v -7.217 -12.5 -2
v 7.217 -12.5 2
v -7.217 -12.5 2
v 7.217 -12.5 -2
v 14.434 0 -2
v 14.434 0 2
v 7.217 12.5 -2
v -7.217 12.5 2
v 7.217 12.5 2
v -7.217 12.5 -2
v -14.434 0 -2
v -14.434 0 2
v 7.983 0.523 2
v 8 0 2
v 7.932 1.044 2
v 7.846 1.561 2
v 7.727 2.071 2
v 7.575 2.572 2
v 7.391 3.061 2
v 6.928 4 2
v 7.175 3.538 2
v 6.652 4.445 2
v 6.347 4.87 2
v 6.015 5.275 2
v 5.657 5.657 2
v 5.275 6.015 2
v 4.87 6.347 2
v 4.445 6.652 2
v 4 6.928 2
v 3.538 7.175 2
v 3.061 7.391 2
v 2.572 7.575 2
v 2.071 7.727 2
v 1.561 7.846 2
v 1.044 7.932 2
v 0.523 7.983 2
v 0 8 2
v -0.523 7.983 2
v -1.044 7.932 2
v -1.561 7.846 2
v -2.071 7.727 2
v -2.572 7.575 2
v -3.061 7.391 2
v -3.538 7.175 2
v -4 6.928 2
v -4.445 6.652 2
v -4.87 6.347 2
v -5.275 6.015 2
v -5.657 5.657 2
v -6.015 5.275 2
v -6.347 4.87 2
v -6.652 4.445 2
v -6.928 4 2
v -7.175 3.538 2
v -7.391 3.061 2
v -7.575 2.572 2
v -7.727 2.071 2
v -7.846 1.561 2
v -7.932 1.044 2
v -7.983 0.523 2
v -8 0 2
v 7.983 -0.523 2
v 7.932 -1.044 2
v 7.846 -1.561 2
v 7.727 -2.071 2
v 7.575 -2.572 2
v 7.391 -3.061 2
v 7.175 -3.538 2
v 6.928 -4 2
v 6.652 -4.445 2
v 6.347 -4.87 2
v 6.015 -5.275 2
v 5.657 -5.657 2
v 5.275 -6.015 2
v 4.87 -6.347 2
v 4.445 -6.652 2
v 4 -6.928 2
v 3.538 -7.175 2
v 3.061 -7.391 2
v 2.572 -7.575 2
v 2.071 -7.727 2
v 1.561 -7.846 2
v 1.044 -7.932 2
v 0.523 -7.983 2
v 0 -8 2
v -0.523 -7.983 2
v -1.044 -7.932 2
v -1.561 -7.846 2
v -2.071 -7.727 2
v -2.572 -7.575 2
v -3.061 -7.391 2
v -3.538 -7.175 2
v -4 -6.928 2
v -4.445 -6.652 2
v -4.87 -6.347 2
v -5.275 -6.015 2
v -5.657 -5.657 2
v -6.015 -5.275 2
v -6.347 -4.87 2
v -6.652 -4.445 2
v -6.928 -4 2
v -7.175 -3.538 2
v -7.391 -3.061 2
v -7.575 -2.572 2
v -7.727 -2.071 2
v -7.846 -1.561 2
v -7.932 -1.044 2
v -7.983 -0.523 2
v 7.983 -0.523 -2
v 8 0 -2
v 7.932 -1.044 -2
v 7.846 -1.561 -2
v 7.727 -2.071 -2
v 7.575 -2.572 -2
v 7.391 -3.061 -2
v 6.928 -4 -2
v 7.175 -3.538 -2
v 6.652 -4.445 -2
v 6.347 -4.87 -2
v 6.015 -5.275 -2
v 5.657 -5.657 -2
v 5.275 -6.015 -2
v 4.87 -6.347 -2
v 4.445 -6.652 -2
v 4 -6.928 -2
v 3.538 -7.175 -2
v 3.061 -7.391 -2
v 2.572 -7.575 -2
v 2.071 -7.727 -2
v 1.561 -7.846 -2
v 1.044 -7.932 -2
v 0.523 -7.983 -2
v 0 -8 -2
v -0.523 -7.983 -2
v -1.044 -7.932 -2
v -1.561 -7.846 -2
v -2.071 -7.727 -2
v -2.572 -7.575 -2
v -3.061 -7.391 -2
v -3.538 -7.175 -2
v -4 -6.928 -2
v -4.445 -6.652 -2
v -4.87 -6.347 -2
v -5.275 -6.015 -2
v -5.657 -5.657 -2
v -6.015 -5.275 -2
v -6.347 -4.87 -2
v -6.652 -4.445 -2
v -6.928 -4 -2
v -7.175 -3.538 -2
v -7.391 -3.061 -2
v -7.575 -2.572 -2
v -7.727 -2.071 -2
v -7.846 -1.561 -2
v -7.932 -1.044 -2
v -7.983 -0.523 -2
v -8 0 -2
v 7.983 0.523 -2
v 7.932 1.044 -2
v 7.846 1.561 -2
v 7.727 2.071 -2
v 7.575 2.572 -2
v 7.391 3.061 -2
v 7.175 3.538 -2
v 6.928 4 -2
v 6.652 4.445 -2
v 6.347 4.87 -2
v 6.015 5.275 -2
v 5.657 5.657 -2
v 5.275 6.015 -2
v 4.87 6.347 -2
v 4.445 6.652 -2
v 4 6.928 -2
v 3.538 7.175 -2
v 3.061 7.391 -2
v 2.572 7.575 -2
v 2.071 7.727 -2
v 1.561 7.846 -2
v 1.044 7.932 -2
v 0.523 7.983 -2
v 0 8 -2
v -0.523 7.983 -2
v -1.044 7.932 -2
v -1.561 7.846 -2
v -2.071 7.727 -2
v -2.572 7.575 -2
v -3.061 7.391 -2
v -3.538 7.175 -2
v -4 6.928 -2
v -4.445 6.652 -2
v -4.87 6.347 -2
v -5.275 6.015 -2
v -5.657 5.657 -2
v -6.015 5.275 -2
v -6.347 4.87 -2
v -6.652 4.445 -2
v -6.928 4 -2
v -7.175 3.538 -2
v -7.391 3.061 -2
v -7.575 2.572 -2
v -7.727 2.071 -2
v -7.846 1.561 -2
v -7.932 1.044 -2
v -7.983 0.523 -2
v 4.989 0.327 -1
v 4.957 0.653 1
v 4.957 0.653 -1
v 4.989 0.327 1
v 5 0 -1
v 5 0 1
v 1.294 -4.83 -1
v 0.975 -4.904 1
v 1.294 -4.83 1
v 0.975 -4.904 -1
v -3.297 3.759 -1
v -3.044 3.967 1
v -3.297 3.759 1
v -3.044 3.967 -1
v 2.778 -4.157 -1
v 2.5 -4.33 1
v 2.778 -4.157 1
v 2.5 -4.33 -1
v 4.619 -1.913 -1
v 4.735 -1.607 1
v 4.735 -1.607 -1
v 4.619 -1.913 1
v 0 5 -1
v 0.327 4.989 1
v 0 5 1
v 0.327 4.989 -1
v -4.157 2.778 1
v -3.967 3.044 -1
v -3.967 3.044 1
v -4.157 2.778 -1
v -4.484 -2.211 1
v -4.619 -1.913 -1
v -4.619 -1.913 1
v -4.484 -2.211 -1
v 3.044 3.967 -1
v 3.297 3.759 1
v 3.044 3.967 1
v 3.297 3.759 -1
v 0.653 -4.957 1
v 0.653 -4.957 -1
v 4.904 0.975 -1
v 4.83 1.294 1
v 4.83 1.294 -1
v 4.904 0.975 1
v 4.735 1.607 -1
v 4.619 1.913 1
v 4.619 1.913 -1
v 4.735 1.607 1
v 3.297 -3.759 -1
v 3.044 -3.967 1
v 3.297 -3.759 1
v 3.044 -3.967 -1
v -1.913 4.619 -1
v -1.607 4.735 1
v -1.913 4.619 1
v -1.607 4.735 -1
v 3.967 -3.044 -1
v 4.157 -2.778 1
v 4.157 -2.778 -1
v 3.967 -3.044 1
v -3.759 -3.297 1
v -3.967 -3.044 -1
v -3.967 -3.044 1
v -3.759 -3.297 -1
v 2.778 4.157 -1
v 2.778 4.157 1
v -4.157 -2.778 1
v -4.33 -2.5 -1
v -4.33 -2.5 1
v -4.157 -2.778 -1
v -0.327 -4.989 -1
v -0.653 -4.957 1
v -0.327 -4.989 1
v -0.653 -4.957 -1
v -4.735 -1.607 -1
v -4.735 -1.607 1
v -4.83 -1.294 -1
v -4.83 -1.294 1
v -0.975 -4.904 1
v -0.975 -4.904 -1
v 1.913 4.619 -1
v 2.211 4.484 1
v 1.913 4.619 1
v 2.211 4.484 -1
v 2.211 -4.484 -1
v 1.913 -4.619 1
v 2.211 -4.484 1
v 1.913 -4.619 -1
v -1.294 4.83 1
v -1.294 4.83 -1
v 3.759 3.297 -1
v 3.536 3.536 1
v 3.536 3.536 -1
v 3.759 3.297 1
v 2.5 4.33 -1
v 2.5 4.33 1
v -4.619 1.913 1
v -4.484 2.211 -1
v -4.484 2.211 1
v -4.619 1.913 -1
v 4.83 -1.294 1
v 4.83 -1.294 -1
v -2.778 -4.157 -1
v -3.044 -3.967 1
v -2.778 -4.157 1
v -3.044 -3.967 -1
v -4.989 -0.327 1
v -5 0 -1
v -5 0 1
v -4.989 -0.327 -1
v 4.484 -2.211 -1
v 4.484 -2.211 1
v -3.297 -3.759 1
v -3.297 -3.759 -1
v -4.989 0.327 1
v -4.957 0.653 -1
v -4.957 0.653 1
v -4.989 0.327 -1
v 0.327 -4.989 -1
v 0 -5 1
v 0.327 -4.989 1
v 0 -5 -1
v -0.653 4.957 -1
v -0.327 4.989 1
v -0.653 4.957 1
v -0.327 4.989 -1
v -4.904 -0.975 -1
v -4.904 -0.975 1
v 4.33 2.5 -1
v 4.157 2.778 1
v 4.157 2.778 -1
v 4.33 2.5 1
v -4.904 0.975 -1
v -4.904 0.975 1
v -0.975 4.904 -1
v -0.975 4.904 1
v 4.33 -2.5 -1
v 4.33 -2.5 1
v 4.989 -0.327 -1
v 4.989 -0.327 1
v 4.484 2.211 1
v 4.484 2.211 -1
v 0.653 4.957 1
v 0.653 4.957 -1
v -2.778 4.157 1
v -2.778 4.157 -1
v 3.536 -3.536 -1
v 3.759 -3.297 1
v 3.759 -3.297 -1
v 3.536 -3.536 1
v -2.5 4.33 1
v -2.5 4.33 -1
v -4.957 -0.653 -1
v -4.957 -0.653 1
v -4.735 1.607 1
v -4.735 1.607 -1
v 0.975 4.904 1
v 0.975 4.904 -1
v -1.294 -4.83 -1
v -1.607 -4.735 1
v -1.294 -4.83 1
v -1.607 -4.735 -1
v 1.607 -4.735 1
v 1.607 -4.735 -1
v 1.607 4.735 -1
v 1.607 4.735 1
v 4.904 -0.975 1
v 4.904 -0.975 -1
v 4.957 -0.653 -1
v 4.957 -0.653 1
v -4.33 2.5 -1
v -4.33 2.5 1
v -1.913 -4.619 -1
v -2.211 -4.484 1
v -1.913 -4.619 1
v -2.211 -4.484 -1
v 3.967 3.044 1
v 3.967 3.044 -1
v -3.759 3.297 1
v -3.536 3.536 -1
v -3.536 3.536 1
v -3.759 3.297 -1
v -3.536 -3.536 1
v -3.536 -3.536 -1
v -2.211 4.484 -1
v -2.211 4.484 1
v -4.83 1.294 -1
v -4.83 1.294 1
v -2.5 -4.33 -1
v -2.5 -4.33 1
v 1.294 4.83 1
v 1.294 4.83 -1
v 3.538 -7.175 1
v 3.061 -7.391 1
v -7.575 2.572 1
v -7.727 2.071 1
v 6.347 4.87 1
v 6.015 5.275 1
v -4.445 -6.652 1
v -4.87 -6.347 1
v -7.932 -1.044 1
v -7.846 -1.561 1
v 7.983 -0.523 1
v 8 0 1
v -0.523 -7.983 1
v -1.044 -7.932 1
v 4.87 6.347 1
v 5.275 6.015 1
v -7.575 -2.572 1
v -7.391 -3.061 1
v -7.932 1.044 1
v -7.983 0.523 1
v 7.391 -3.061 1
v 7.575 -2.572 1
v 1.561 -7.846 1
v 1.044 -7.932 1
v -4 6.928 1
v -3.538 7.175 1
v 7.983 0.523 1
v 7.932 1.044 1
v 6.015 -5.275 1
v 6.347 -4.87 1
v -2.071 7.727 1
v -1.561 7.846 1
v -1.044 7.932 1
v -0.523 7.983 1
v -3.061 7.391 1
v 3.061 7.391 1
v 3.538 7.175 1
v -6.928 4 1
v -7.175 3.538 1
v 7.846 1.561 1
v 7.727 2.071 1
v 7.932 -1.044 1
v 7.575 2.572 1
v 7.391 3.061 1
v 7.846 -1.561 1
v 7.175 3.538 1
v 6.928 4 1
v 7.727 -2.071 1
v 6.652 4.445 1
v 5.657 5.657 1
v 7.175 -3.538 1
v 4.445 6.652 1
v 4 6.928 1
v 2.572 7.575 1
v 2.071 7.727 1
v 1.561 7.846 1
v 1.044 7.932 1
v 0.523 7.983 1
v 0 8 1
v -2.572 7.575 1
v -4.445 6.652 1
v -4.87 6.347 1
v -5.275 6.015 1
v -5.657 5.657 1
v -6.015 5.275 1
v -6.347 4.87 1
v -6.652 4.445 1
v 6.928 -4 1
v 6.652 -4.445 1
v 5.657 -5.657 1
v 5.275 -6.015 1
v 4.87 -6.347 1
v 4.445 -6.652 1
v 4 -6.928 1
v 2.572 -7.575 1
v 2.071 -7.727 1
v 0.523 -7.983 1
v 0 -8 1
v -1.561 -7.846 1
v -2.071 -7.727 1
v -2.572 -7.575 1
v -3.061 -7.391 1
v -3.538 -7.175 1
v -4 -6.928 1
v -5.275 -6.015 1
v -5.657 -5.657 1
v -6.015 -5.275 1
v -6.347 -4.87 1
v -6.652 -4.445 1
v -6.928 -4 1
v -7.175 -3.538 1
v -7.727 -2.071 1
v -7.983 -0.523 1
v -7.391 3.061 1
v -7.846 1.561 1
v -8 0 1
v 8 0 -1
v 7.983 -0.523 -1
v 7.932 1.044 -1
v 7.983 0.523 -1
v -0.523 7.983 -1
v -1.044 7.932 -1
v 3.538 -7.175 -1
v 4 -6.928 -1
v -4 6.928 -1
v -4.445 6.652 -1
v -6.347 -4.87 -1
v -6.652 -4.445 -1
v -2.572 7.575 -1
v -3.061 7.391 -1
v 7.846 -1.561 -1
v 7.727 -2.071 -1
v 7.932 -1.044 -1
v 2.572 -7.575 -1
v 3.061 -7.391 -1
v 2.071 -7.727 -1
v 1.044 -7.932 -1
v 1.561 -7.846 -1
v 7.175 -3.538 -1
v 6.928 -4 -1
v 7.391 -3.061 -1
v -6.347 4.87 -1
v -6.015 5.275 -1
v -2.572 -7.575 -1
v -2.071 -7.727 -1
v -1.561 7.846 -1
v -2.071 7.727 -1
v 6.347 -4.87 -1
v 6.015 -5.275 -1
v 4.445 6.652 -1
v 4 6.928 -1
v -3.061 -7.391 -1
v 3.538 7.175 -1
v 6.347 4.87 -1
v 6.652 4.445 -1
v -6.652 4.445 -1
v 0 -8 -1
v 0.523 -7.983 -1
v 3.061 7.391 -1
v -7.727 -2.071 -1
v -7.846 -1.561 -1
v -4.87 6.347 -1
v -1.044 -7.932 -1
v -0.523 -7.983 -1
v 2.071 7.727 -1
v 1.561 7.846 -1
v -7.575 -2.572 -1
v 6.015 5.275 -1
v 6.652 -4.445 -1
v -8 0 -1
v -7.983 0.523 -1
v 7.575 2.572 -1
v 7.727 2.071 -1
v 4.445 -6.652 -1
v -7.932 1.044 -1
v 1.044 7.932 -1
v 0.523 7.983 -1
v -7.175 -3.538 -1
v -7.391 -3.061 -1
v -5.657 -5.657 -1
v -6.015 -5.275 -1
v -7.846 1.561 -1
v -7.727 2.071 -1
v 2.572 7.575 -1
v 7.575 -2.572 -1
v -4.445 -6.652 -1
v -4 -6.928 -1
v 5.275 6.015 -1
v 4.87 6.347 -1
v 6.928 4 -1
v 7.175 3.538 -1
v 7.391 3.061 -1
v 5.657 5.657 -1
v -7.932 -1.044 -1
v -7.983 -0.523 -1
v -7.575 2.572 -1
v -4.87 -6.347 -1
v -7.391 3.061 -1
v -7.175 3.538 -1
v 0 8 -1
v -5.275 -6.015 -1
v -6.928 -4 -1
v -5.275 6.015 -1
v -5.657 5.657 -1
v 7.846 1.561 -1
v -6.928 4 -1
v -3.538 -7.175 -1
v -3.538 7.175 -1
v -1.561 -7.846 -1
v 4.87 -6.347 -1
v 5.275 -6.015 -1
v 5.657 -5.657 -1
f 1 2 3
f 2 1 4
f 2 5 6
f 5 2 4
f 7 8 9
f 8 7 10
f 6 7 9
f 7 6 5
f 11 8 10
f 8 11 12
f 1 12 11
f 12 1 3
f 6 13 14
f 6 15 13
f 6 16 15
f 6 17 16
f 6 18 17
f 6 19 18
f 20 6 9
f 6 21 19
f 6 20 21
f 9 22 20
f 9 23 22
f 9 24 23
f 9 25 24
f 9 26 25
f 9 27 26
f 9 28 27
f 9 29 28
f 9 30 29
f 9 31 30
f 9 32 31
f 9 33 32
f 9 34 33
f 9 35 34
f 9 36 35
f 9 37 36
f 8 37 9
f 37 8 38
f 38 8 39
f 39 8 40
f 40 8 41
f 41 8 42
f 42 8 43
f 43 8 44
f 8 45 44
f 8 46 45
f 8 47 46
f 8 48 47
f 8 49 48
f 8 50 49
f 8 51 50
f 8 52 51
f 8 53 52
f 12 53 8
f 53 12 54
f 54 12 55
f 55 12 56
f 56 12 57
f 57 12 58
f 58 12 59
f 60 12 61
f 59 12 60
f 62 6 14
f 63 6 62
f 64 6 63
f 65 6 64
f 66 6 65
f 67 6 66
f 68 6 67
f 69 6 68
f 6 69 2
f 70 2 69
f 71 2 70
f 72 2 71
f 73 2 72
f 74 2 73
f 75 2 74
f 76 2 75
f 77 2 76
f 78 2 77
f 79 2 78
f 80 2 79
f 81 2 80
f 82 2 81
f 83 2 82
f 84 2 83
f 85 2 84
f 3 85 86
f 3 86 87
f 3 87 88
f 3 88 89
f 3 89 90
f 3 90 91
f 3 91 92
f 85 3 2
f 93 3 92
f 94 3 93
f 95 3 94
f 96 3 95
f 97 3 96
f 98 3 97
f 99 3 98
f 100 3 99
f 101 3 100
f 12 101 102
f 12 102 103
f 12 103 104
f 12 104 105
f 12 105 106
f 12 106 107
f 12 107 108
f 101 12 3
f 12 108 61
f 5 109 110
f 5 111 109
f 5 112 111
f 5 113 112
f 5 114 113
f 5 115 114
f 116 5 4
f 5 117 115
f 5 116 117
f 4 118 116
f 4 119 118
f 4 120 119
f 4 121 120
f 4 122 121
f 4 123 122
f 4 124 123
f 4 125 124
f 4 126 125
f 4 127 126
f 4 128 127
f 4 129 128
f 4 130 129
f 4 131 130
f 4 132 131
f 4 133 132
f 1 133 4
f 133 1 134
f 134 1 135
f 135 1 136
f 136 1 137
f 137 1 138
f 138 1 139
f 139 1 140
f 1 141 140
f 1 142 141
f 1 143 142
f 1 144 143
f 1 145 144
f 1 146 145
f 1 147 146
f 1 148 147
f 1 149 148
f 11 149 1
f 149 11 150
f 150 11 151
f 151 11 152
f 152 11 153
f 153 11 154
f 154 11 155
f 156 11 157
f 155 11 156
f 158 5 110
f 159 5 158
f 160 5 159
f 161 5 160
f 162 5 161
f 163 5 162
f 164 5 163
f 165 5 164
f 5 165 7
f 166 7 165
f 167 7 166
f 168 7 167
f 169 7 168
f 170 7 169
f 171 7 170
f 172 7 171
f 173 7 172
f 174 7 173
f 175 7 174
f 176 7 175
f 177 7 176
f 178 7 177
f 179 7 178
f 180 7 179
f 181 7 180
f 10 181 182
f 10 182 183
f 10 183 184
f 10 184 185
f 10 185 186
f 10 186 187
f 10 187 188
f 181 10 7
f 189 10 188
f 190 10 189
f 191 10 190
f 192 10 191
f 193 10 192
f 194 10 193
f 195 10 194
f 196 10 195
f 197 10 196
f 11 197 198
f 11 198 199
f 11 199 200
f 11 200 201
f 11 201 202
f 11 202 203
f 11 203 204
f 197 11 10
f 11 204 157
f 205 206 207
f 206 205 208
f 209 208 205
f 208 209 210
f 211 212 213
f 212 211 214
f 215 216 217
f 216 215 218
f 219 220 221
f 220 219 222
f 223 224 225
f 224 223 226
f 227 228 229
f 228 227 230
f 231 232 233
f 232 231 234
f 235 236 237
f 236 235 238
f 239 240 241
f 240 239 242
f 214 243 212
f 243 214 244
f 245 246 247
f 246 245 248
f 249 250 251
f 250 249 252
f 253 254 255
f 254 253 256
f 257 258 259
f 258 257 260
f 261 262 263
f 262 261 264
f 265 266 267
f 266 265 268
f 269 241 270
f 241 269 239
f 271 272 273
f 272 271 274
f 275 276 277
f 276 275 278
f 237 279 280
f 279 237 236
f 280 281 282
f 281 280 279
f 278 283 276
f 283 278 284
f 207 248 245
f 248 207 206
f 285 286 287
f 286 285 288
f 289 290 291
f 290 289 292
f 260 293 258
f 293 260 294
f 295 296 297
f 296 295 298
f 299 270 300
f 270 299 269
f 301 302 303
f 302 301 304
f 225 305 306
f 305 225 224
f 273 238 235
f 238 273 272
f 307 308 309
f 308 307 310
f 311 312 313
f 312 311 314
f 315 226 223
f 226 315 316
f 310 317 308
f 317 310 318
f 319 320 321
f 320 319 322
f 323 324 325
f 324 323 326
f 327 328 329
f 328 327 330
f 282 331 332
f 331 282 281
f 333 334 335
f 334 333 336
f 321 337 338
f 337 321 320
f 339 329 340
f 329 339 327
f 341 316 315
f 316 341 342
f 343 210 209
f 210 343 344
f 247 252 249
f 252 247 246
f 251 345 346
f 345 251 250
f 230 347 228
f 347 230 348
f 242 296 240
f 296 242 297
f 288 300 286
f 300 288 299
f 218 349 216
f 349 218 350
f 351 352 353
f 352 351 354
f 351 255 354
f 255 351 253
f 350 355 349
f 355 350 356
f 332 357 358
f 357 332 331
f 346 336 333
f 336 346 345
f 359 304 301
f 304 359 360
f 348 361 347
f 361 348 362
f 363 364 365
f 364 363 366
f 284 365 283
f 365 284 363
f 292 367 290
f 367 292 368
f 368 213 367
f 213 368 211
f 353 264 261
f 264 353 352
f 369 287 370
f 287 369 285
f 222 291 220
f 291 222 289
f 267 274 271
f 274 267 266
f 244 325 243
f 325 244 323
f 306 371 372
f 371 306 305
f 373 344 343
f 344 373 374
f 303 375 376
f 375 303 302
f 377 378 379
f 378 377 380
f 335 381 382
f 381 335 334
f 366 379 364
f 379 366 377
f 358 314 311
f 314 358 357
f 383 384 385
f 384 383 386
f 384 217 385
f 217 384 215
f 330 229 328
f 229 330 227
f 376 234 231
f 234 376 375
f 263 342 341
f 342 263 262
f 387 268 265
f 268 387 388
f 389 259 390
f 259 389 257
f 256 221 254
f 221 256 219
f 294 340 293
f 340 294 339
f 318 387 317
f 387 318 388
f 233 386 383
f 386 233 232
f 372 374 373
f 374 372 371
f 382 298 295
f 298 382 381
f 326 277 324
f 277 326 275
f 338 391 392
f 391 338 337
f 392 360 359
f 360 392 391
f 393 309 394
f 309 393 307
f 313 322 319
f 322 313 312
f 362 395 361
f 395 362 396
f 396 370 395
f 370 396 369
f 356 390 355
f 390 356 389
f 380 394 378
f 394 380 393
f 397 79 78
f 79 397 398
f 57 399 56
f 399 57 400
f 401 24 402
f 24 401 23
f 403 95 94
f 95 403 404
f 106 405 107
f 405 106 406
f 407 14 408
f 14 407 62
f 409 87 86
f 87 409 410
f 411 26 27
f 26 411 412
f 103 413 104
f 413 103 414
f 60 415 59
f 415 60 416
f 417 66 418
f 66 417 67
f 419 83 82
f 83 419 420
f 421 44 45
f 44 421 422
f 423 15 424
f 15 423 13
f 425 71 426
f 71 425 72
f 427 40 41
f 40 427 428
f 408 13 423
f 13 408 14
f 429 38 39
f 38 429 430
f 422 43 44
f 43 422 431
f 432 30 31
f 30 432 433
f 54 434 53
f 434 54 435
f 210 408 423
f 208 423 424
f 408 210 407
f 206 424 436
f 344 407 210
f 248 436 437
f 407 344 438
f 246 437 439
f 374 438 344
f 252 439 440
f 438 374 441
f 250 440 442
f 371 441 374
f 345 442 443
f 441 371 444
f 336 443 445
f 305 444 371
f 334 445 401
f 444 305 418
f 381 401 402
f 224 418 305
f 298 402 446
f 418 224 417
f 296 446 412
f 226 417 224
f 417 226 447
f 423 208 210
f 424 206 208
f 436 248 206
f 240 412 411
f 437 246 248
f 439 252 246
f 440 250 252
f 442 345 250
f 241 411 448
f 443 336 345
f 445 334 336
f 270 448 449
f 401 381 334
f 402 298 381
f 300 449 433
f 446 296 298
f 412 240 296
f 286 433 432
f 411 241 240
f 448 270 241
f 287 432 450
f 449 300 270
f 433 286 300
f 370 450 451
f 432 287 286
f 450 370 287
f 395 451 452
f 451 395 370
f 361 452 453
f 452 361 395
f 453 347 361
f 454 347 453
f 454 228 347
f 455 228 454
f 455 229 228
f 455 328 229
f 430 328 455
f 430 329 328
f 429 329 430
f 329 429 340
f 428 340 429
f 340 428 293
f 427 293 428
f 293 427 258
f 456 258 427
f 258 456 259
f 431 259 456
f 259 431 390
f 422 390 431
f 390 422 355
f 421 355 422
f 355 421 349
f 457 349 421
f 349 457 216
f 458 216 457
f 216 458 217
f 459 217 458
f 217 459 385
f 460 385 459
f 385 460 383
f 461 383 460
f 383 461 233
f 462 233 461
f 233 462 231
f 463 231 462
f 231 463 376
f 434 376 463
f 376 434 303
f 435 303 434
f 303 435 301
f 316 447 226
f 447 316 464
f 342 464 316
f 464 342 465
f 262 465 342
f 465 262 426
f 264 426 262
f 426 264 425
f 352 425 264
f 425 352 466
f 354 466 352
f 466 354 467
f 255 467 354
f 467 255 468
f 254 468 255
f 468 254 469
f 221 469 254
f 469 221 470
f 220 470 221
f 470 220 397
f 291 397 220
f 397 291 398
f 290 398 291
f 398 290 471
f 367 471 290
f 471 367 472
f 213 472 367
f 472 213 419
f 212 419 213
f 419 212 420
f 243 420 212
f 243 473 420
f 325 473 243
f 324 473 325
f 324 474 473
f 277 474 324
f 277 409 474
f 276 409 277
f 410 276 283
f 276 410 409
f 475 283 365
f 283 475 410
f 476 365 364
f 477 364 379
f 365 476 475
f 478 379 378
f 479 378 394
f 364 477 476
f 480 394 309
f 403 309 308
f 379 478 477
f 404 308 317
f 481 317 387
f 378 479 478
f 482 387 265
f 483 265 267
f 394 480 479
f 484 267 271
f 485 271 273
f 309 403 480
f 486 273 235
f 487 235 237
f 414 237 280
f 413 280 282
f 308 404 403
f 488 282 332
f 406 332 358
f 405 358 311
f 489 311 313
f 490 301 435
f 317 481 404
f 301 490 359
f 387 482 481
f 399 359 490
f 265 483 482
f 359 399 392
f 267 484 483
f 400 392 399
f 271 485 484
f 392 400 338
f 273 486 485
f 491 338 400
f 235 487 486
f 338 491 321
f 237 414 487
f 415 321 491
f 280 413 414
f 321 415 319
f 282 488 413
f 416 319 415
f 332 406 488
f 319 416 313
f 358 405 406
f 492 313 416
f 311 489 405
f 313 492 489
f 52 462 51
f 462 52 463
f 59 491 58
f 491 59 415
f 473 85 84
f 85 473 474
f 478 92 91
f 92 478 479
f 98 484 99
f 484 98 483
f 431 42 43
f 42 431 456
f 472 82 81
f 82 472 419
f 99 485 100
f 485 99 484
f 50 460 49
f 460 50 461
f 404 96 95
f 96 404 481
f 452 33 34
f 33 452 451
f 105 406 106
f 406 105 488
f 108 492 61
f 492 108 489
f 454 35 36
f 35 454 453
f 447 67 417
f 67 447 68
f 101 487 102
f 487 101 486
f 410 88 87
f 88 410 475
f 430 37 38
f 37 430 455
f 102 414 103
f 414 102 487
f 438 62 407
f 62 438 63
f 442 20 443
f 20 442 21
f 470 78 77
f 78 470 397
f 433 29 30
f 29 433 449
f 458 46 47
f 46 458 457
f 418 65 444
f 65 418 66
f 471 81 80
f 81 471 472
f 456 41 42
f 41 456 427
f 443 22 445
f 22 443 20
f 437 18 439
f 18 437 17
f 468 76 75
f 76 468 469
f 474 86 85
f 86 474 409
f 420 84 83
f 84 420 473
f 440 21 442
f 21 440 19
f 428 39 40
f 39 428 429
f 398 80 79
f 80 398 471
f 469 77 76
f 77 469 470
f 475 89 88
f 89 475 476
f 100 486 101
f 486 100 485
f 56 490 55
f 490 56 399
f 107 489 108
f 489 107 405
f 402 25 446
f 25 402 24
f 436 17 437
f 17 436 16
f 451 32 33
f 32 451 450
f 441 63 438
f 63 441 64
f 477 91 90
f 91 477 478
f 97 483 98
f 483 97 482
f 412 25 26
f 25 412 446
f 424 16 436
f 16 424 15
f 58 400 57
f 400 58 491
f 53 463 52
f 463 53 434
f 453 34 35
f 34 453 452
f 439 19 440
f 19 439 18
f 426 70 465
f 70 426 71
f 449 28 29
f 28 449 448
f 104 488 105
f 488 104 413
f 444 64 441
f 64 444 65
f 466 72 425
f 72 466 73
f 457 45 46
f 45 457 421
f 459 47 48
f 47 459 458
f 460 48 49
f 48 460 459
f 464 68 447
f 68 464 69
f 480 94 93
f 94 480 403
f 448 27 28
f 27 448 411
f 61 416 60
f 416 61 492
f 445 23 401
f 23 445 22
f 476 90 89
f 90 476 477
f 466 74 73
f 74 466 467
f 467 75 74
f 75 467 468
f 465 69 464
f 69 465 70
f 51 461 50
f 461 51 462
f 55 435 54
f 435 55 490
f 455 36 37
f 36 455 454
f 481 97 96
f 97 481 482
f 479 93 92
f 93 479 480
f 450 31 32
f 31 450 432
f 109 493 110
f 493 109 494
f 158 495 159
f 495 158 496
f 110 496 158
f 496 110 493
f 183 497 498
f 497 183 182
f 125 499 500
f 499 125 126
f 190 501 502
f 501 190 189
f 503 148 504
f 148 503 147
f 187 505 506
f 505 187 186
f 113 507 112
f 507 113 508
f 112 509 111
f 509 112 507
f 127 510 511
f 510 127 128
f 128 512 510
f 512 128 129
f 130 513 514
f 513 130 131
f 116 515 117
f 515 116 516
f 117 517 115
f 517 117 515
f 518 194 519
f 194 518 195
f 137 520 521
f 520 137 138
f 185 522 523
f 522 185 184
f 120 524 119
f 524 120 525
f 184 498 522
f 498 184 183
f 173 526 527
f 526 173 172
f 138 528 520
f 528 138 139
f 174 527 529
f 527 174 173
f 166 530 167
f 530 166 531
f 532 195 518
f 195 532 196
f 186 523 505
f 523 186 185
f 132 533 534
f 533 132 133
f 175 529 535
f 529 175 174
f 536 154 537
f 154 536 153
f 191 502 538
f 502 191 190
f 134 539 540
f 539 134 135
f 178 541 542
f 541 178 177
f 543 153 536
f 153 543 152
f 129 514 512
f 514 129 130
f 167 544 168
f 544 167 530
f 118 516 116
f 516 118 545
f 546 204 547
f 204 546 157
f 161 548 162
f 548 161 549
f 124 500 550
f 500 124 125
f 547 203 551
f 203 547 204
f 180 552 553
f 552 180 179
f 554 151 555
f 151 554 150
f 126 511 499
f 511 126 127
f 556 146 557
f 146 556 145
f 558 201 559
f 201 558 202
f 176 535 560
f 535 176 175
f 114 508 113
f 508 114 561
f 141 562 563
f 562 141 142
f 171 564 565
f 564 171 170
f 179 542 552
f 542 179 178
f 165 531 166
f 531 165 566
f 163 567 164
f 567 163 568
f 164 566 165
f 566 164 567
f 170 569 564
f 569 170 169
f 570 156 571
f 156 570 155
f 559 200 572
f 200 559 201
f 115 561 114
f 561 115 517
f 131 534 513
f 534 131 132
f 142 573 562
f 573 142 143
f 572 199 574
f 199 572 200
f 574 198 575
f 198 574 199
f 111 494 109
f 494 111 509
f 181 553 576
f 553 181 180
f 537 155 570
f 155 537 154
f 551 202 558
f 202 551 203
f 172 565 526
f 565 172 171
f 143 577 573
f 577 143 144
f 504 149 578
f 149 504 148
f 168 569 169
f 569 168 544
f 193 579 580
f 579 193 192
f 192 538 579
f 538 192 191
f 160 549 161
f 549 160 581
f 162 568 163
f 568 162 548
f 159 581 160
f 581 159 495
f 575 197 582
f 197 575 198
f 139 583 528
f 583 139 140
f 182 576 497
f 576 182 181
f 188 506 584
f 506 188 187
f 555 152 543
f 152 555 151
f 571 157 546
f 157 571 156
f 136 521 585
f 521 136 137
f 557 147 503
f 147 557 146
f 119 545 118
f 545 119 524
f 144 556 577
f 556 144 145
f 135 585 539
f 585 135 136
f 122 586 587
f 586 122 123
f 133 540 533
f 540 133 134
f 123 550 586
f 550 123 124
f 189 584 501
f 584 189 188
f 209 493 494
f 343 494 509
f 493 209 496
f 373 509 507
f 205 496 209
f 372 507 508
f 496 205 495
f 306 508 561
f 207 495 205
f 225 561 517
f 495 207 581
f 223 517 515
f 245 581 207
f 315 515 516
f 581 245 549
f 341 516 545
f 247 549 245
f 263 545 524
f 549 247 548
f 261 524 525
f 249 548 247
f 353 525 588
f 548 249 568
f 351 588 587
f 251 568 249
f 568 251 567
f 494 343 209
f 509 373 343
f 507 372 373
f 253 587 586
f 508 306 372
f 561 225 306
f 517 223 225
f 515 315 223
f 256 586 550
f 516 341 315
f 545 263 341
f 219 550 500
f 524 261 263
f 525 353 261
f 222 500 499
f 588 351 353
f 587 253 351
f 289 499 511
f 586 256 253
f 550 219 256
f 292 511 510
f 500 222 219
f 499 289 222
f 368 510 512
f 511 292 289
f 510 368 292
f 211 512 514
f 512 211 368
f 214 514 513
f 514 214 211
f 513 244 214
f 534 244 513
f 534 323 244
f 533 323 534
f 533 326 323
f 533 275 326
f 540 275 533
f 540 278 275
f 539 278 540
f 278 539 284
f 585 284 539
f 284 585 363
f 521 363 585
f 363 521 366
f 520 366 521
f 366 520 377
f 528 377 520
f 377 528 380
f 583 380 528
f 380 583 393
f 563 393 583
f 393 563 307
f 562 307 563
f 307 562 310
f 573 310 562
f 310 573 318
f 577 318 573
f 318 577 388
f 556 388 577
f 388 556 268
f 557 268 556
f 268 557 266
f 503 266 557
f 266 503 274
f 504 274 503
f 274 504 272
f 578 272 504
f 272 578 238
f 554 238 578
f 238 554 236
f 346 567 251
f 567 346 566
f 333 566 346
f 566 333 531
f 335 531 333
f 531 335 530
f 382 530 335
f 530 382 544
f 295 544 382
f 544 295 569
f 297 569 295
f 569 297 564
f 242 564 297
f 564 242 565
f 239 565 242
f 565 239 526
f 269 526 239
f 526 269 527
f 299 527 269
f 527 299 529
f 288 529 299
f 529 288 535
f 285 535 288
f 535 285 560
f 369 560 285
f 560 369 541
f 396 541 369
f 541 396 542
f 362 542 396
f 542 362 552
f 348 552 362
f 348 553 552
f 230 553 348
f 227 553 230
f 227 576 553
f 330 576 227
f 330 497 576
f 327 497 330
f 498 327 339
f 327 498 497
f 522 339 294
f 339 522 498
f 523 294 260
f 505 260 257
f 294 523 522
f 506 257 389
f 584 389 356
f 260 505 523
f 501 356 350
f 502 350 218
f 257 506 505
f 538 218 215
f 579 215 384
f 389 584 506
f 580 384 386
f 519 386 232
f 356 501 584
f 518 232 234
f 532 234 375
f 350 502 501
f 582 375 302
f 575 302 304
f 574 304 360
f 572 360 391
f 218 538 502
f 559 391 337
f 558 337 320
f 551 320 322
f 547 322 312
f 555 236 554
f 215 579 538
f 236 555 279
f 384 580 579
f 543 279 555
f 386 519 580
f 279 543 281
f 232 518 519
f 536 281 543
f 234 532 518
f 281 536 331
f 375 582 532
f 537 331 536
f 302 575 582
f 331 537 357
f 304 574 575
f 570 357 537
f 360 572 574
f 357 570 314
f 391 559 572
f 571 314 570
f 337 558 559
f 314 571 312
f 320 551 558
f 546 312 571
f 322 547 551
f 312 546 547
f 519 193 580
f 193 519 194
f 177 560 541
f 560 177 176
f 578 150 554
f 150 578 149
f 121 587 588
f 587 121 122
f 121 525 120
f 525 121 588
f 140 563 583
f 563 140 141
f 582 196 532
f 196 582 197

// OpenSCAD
$fn = 96;

// Target bounding box (approx): 25.0 x 21.65 x 4.0 mm
bbox_X = 25.0;
bbox_Y = 21.65;
T      = 4.0;

// Geometry
hole_d = 10.0;     // through-hole diameter
step_d = 16.0;     // diameter of shallow recess/boss feature
step_h = 1.0;      // depth of recess from each face (creates a midsection "step")
overlap = 0.2;     // small overlap for robust booleans

// Regular hex sized by flat-to-flat distance
module hex_prism(flat_to_flat, h, center=true) {
    // For a regular hex, flat-to-flat = sqrt(3) * R (circumradius)
    R = flat_to_flat / sqrt(3);
    cylinder(h=h, r=R, $fn=6, center=center);
}

module model() {
    difference() {
        // Outer hex plate
        difference() {
            hex_prism(bbox_X, T, center=true);

            // Through hole
            cylinder(h=T + 2*overlap, r=hole_d/2, center=true);

            // Shallow recess from top face
            translate([0, 0,  T/2 - step_h/2 + overlap/2])
                cylinder(h=step_h + overlap, r=step_d/2, center=true);

            // Shallow recess from bottom face (symmetric)
            translate([0, 0, -T/2 + step_h/2 - overlap/2])
                cylinder(h=step_h + overlap, r=step_d/2, center=true);
        }
    }
}

color("Silver") model();
